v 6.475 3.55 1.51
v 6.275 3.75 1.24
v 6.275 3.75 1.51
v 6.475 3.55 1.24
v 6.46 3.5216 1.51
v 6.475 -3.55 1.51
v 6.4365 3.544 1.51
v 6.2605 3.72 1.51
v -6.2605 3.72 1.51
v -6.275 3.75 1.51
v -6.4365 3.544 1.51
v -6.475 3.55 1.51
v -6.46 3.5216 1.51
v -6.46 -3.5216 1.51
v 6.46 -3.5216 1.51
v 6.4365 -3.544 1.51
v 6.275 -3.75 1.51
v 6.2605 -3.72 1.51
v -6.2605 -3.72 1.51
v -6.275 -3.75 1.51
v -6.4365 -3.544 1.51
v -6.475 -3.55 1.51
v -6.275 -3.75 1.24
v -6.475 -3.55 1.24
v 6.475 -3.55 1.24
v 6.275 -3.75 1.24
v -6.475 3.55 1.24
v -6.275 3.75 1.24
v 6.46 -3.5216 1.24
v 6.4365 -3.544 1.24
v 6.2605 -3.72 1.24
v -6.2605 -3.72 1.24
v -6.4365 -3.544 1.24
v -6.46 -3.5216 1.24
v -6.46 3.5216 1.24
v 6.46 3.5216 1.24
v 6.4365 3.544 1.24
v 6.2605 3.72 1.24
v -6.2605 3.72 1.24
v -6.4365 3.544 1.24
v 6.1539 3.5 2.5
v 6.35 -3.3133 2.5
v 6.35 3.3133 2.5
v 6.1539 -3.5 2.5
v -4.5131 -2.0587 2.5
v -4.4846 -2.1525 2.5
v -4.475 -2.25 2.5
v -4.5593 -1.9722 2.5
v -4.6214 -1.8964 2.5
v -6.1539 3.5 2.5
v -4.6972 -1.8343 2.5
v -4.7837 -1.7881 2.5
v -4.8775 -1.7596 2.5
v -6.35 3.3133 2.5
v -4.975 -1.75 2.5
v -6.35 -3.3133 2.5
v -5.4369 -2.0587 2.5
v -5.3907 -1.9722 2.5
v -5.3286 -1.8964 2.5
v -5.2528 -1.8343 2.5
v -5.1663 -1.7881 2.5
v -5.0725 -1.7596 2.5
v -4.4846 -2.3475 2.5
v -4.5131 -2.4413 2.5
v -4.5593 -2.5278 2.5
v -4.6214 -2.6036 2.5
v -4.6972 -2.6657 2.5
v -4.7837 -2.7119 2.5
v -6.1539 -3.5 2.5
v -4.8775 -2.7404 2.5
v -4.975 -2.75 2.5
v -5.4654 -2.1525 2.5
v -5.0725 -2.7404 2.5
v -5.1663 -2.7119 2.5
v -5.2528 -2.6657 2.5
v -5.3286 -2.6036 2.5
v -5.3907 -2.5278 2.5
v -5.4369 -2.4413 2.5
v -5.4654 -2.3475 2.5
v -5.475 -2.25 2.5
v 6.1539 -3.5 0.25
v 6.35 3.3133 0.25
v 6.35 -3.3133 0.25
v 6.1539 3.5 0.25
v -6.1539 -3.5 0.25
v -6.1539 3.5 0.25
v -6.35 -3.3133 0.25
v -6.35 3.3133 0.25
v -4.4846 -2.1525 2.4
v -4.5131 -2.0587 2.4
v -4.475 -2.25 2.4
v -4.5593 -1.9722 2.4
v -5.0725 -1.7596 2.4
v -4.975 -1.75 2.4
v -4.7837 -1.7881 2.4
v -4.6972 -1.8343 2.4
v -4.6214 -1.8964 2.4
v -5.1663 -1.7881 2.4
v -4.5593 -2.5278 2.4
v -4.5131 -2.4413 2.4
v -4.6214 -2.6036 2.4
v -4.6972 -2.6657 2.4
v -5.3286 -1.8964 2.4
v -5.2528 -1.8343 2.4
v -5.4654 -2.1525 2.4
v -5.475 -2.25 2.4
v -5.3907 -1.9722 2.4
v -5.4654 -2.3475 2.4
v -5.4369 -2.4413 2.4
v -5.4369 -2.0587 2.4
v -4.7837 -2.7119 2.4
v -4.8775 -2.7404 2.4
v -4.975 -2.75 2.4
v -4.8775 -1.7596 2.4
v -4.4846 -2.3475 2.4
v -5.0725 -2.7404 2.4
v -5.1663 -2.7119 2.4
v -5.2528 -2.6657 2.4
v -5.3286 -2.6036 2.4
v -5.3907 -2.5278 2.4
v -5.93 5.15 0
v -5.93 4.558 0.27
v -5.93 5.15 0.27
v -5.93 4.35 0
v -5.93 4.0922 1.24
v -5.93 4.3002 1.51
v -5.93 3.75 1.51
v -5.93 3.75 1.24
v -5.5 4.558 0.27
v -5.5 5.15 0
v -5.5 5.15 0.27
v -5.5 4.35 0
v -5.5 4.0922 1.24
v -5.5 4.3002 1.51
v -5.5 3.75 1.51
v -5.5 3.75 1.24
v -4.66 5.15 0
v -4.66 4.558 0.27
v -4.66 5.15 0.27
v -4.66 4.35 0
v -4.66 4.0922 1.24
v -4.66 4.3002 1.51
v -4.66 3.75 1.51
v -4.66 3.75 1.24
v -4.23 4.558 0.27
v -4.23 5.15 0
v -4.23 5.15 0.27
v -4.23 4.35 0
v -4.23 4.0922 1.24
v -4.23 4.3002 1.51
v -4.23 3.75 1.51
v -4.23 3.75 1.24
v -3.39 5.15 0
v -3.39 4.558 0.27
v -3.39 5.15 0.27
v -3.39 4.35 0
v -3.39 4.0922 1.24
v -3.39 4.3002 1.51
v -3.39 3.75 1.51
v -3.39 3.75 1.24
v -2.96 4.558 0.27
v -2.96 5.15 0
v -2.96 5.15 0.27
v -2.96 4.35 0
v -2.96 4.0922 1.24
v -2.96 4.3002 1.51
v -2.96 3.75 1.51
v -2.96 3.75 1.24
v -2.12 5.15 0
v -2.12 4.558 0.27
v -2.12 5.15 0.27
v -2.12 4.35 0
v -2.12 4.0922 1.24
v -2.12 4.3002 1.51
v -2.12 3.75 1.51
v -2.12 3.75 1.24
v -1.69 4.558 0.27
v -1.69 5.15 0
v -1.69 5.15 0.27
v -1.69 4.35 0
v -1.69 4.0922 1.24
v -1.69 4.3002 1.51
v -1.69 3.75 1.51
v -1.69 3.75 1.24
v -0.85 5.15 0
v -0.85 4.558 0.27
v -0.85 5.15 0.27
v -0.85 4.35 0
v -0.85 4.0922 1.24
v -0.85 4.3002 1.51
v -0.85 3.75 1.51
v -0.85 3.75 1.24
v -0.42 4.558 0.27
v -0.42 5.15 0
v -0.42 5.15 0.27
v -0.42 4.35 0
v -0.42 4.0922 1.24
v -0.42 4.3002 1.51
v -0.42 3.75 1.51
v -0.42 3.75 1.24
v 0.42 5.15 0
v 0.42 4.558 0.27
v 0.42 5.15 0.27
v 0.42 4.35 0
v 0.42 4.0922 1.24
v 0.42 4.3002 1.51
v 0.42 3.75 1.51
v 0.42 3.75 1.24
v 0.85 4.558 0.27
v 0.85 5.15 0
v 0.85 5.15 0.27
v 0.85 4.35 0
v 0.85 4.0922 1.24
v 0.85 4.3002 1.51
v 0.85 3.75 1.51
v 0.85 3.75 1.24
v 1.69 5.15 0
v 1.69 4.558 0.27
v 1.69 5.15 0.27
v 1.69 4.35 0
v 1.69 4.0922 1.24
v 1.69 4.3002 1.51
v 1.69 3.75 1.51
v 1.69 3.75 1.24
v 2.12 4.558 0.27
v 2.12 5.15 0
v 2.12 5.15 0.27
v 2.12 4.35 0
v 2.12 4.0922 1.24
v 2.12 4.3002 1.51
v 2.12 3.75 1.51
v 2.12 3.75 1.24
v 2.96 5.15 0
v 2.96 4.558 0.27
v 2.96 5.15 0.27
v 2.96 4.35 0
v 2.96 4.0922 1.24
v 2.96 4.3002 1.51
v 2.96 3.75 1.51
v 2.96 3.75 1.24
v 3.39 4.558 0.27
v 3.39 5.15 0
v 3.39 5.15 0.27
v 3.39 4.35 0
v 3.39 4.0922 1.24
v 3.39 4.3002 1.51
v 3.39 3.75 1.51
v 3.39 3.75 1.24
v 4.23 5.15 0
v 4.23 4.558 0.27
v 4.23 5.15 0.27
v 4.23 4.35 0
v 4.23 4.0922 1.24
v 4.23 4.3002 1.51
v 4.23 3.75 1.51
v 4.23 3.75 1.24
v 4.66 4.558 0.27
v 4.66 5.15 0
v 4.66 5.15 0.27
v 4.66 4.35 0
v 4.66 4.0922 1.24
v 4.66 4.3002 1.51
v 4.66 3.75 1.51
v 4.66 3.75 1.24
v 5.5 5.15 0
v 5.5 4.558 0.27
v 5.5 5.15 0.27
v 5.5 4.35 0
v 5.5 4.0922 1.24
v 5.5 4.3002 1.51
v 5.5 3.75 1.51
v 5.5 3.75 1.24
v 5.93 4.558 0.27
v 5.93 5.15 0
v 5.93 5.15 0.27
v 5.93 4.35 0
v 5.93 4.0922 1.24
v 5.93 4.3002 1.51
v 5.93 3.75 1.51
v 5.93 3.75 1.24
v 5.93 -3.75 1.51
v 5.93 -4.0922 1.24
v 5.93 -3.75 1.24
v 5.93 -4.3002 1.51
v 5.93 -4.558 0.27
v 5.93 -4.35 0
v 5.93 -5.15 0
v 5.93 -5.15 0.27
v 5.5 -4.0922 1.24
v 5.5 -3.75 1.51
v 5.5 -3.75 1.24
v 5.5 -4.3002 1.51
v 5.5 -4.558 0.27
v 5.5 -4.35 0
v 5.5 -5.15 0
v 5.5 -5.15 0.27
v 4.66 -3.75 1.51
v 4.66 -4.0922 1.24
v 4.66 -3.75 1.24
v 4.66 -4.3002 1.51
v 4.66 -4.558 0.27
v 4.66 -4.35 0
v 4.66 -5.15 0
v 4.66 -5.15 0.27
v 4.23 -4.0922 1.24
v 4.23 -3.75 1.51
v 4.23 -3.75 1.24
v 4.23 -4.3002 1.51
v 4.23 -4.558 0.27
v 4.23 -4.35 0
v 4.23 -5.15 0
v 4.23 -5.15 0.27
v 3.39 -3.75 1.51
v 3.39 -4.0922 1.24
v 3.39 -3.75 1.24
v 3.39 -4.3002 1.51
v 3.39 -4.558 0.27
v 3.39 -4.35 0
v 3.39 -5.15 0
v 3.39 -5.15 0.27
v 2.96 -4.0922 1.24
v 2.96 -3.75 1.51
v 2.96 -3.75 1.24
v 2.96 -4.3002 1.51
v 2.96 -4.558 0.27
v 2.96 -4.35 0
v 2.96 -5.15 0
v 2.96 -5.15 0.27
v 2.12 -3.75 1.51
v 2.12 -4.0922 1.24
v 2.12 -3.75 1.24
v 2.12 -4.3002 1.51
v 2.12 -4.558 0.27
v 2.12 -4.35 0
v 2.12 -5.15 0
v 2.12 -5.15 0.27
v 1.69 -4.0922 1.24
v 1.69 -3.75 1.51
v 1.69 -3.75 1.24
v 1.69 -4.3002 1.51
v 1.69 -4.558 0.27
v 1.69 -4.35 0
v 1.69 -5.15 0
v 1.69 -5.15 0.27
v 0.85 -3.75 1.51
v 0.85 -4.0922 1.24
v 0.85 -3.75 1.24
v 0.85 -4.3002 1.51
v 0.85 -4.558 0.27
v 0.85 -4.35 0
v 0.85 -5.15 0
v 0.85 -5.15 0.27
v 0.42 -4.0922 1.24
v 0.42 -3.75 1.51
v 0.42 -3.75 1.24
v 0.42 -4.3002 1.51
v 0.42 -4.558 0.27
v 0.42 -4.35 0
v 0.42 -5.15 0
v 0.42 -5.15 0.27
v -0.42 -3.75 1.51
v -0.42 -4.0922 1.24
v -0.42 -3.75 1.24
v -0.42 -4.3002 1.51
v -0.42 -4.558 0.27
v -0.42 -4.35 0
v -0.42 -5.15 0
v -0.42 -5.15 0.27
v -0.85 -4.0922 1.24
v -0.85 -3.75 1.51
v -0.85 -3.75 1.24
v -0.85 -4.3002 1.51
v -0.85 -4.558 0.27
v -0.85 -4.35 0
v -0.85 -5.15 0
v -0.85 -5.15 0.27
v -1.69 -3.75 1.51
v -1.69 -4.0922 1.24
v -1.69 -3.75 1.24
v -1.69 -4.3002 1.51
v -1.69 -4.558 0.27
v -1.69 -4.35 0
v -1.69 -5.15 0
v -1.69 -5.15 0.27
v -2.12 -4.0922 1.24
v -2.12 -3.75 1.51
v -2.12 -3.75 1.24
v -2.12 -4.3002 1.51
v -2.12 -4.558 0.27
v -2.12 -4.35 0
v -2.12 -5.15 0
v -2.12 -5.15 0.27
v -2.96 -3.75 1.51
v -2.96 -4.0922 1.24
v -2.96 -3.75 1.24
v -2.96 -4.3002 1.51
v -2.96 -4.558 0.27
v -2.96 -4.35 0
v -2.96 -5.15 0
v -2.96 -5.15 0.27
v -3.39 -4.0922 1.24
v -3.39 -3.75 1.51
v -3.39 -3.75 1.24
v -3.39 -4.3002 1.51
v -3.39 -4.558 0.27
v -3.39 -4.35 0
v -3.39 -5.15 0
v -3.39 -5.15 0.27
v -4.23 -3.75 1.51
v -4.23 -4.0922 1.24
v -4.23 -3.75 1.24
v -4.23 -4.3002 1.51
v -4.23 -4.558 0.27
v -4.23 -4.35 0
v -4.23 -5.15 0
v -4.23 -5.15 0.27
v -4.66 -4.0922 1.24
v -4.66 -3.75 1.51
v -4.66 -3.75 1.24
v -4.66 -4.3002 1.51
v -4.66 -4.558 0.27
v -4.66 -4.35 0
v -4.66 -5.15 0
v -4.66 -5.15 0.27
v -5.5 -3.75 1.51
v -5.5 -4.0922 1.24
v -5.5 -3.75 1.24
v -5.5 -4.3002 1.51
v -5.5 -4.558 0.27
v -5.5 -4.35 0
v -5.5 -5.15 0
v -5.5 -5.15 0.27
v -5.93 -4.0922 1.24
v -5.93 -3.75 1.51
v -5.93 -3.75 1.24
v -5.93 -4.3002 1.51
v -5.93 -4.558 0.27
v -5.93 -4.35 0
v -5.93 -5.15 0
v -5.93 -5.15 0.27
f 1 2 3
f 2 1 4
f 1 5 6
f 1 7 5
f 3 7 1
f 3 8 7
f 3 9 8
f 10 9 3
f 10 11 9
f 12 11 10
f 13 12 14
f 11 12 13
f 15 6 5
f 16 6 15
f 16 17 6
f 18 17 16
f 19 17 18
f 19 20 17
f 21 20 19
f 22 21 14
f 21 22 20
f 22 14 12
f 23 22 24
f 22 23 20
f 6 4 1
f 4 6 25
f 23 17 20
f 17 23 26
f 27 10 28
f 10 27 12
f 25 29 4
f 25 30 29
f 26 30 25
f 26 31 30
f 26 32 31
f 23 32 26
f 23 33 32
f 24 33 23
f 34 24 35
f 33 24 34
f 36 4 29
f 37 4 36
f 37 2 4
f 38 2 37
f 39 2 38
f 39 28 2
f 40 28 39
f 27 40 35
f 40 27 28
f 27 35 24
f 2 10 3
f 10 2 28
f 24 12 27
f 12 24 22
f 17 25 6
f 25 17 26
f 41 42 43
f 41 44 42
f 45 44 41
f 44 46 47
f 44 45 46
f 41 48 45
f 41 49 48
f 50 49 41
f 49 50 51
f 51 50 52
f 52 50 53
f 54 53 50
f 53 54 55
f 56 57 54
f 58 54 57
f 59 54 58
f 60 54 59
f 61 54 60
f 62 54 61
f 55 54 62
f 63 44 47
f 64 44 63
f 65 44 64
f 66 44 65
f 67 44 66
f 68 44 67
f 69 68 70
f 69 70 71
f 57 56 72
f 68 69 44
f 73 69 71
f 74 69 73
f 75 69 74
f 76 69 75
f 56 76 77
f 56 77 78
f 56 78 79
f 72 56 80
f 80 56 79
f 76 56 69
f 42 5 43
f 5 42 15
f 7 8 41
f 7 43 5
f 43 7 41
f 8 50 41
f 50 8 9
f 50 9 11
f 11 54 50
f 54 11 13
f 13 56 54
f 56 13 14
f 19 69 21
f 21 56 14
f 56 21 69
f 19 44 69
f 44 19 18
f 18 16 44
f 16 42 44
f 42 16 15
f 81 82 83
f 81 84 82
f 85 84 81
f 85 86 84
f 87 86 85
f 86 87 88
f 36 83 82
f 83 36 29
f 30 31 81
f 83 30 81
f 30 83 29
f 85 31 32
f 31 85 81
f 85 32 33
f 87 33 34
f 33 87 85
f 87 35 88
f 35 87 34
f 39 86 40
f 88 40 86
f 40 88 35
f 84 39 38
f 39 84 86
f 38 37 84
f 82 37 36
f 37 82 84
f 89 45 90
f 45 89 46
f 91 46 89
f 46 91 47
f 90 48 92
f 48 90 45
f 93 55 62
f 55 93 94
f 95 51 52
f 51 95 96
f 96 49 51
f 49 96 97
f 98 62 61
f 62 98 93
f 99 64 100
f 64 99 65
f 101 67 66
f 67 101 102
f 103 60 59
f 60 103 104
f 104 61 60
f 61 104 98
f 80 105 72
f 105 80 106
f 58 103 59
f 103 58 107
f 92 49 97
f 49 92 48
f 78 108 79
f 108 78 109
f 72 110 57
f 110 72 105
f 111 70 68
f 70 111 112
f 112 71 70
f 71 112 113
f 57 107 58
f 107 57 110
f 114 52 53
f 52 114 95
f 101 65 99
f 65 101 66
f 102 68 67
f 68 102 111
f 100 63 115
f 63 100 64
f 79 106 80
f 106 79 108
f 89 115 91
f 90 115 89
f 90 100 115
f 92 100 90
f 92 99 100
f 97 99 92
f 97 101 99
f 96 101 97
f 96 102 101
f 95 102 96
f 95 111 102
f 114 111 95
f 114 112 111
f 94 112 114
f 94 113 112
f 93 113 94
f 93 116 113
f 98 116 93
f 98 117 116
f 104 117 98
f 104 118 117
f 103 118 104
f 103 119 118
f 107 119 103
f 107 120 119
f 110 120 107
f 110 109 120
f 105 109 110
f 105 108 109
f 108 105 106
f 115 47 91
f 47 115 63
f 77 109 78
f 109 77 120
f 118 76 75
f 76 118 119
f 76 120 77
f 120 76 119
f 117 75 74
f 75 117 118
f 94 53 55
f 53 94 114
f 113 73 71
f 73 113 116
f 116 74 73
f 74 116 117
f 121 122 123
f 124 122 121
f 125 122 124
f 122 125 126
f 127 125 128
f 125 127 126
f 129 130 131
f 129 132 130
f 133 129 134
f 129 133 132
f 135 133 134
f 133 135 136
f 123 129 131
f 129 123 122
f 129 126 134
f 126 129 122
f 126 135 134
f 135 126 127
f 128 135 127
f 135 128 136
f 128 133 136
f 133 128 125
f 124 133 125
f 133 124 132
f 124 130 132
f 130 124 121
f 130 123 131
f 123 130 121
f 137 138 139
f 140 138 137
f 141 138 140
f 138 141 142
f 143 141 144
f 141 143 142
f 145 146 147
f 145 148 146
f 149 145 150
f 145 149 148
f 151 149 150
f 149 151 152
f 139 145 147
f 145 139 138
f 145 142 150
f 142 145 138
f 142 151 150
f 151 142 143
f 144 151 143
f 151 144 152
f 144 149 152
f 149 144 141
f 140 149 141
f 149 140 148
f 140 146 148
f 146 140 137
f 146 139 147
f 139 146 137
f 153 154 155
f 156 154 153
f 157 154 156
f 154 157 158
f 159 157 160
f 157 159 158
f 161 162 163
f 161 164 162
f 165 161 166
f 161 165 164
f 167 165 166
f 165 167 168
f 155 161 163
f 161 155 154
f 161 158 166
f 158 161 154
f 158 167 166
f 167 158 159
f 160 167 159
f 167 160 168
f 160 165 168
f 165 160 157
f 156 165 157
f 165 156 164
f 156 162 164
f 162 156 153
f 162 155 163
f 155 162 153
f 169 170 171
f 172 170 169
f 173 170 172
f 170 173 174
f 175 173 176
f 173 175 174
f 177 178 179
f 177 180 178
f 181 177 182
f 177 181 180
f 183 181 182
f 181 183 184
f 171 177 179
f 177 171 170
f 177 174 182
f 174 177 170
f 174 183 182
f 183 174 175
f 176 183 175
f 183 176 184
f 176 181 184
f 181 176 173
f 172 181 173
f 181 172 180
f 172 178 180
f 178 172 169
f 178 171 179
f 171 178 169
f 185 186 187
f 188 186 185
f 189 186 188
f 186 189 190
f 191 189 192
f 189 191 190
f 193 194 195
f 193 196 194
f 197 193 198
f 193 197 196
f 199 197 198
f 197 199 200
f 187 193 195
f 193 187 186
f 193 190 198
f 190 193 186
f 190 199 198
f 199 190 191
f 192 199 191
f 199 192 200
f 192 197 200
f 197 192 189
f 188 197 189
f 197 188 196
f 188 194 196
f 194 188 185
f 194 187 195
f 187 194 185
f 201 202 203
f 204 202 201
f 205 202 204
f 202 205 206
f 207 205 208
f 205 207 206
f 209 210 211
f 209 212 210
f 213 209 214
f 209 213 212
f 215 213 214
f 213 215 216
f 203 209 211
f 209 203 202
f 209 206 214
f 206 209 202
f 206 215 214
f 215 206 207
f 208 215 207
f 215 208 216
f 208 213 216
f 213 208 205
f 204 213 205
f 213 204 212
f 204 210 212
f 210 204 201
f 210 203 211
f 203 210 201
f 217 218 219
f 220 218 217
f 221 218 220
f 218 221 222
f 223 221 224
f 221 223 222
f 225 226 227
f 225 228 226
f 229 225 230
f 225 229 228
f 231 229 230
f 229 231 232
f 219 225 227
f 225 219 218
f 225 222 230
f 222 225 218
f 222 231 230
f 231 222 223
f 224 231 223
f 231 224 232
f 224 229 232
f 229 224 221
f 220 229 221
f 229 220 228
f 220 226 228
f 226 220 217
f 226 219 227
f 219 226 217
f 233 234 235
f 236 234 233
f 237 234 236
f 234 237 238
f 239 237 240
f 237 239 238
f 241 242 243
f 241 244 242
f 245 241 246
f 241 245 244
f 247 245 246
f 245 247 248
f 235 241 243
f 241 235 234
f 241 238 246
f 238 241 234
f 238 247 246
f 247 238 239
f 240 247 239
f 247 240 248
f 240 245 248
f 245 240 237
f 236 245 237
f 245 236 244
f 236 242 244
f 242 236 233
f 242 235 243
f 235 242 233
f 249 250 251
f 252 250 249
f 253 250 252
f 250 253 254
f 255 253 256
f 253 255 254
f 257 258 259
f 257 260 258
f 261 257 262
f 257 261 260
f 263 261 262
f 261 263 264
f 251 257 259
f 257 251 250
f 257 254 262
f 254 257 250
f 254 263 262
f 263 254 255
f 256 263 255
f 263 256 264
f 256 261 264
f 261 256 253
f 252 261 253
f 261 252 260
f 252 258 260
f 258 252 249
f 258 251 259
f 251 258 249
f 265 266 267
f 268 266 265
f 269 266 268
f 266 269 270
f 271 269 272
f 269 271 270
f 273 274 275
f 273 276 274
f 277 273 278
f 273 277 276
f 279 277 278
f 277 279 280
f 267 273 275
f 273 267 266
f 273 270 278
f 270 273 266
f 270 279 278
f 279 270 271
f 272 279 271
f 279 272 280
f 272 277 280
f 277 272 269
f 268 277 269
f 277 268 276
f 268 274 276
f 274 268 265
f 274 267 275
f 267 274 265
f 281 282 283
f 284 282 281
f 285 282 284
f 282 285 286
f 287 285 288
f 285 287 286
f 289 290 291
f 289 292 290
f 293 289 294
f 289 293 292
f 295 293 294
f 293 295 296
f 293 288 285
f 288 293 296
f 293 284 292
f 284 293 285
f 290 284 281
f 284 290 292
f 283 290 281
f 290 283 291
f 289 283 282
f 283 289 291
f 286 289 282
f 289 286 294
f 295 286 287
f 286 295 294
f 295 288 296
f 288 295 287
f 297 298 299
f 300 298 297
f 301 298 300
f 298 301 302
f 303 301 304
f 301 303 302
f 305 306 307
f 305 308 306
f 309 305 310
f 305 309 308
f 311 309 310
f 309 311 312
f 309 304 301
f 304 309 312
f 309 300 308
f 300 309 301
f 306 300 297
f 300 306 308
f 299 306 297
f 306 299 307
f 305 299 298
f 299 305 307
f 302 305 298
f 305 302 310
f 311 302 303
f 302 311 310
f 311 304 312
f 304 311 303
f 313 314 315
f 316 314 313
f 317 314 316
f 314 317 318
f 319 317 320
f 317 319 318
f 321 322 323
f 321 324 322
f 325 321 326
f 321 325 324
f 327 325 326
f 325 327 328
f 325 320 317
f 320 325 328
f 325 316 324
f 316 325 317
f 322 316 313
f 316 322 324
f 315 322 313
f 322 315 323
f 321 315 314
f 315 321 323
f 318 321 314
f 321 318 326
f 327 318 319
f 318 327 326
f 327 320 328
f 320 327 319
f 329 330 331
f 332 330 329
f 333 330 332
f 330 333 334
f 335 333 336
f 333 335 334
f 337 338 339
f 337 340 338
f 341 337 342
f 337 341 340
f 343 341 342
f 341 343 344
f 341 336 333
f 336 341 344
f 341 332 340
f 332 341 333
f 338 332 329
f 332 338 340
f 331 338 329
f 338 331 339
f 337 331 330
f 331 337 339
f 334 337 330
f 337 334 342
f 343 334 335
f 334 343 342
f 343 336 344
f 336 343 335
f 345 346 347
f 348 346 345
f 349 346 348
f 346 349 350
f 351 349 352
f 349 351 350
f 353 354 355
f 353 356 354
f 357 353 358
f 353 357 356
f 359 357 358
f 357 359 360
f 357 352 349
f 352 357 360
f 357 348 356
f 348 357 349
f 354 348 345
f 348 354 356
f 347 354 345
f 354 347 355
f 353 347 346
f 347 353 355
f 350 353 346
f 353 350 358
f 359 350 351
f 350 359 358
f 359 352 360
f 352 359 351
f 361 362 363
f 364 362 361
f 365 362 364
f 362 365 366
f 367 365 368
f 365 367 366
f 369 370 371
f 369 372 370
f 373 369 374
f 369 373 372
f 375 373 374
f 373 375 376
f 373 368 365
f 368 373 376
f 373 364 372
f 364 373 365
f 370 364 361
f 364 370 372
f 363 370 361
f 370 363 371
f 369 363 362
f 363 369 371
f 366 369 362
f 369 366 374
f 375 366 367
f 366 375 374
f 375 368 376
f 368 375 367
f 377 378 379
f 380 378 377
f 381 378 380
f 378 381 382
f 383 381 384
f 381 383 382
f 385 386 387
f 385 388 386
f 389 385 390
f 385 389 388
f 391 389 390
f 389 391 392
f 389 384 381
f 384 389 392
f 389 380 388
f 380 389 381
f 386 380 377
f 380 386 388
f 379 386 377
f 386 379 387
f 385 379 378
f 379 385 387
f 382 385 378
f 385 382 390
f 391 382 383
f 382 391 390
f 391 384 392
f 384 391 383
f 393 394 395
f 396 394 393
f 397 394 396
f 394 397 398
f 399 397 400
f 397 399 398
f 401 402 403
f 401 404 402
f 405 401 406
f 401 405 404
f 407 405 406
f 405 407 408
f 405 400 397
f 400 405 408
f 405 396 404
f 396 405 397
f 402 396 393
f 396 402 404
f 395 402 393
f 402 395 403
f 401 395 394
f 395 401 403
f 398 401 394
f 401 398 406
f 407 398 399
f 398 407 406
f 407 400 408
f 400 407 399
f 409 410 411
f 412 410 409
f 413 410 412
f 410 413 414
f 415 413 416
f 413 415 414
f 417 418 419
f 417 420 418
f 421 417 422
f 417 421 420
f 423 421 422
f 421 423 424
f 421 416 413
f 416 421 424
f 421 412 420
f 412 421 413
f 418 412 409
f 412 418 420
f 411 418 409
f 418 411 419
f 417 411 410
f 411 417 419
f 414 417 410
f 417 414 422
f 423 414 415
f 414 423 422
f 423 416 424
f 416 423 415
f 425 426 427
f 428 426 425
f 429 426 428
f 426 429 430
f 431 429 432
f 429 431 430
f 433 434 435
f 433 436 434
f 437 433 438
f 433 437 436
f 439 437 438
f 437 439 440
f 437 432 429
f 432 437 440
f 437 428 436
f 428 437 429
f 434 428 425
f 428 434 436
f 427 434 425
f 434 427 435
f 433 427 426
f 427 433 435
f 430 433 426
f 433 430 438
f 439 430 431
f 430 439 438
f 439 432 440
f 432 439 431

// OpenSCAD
pins = 20;
pin_pitch = 1.27;
pin_width = 0.43;
pin_seating = 0.8;
pin_gull_angle = 12;
leadframe_thickness = 0.27;

overall_width = 10.3;
body_width = 7.5;
body_length = 12.95;
body_thickness = 2.25;

total_thickness = 2.5;

body_length_bevel = 0.25;
body_width_bevel = 0.5;
body_chamfer = 0.2;


leadframe_height = total_thickness - body_thickness/2;

index_mark_offset = min(min(body_width, body_length) * 0.3, 1.5);
index_mark_radius = min(index_mark_offset / 3, 0.5);


difference() {
    body();
    color("#ddd") translate([
        -body_length / 2 + index_mark_offset,
        -body_width / 2 + index_mark_offset,
        total_thickness - 0.1,
    ]) cylinder(h = 10, r = index_mark_radius, $fn=32);
}


translate([pin_pitch * ((pins / 2) - 1) / -2, overall_width / 2, 0]) for(n = [0 : pins / 2 - 1]) {
    translate([pin_pitch * n, 0, 0]) pin();
}
rotate([0, 0, 180]) translate([pin_pitch * ((pins / 2) - 1) / -2, overall_width / 2, 0]) for(n = [0 : pins / 2 - 1]) {
    translate([pin_pitch * n, 0, 0]) pin();
}


module pin() {
    color("#999") rotate([90, 0, 90]) linear_extrude(height = pin_width, center = true) {
        gull_offset = leadframe_height - leadframe_thickness / 2;
        pin_length = (overall_width - body_width) / 2;
        sine = sin(pin_gull_angle);
        cosine = cos(pin_gull_angle);
        polygon([
            [0, 0],
            [-pin_seating, 0],
            [-pin_seating - sine * gull_offset, gull_offset],
            [-pin_length, gull_offset],
            [-pin_length, gull_offset + leadframe_thickness],
            [-pin_seating - sine * (gull_offset + leadframe_thickness) + cosine * leadframe_thickness, gull_offset + leadframe_thickness],
            [-pin_seating - sine * leadframe_thickness + cosine * leadframe_thickness, leadframe_thickness],
            [0, leadframe_thickness],
        ]);
    }
}


module body() {
    color("#555") translate([0, 0, leadframe_height]) {
        linear_extrude(height = leadframe_thickness, center = true) body_outline();
        linear_extrude(
            height = body_thickness / 2,
            scale = [(body_length - body_length_bevel) / body_length, (body_width - body_width_bevel) / body_width]
        ) body_outline();
        
        rotate([180, 0, 0]) linear_extrude(
            height = body_thickness / 2,
            scale = [(body_length - body_length_bevel) / body_length, (body_width - body_width_bevel) / body_width]
        ) body_outline();
    }
}
module body_outline() {
    polygon([
        [ -body_length/2 + body_chamfer, -body_width/2 ],
        [ -body_length/2               , -body_width/2 + body_chamfer ],
        [ -body_length/2               , +body_width/2 - body_chamfer ],
        [ -body_length/2 + body_chamfer, +body_width/2 ],
        [ +body_length/2 - body_chamfer, +body_width/2 ],
        [ +body_length/2               , +body_width/2 - body_chamfer ],
        [ +body_length/2               , -body_width/2 + body_chamfer ],
        [ +body_length/2 - body_chamfer, -body_width/2 ],
    ]);
}
